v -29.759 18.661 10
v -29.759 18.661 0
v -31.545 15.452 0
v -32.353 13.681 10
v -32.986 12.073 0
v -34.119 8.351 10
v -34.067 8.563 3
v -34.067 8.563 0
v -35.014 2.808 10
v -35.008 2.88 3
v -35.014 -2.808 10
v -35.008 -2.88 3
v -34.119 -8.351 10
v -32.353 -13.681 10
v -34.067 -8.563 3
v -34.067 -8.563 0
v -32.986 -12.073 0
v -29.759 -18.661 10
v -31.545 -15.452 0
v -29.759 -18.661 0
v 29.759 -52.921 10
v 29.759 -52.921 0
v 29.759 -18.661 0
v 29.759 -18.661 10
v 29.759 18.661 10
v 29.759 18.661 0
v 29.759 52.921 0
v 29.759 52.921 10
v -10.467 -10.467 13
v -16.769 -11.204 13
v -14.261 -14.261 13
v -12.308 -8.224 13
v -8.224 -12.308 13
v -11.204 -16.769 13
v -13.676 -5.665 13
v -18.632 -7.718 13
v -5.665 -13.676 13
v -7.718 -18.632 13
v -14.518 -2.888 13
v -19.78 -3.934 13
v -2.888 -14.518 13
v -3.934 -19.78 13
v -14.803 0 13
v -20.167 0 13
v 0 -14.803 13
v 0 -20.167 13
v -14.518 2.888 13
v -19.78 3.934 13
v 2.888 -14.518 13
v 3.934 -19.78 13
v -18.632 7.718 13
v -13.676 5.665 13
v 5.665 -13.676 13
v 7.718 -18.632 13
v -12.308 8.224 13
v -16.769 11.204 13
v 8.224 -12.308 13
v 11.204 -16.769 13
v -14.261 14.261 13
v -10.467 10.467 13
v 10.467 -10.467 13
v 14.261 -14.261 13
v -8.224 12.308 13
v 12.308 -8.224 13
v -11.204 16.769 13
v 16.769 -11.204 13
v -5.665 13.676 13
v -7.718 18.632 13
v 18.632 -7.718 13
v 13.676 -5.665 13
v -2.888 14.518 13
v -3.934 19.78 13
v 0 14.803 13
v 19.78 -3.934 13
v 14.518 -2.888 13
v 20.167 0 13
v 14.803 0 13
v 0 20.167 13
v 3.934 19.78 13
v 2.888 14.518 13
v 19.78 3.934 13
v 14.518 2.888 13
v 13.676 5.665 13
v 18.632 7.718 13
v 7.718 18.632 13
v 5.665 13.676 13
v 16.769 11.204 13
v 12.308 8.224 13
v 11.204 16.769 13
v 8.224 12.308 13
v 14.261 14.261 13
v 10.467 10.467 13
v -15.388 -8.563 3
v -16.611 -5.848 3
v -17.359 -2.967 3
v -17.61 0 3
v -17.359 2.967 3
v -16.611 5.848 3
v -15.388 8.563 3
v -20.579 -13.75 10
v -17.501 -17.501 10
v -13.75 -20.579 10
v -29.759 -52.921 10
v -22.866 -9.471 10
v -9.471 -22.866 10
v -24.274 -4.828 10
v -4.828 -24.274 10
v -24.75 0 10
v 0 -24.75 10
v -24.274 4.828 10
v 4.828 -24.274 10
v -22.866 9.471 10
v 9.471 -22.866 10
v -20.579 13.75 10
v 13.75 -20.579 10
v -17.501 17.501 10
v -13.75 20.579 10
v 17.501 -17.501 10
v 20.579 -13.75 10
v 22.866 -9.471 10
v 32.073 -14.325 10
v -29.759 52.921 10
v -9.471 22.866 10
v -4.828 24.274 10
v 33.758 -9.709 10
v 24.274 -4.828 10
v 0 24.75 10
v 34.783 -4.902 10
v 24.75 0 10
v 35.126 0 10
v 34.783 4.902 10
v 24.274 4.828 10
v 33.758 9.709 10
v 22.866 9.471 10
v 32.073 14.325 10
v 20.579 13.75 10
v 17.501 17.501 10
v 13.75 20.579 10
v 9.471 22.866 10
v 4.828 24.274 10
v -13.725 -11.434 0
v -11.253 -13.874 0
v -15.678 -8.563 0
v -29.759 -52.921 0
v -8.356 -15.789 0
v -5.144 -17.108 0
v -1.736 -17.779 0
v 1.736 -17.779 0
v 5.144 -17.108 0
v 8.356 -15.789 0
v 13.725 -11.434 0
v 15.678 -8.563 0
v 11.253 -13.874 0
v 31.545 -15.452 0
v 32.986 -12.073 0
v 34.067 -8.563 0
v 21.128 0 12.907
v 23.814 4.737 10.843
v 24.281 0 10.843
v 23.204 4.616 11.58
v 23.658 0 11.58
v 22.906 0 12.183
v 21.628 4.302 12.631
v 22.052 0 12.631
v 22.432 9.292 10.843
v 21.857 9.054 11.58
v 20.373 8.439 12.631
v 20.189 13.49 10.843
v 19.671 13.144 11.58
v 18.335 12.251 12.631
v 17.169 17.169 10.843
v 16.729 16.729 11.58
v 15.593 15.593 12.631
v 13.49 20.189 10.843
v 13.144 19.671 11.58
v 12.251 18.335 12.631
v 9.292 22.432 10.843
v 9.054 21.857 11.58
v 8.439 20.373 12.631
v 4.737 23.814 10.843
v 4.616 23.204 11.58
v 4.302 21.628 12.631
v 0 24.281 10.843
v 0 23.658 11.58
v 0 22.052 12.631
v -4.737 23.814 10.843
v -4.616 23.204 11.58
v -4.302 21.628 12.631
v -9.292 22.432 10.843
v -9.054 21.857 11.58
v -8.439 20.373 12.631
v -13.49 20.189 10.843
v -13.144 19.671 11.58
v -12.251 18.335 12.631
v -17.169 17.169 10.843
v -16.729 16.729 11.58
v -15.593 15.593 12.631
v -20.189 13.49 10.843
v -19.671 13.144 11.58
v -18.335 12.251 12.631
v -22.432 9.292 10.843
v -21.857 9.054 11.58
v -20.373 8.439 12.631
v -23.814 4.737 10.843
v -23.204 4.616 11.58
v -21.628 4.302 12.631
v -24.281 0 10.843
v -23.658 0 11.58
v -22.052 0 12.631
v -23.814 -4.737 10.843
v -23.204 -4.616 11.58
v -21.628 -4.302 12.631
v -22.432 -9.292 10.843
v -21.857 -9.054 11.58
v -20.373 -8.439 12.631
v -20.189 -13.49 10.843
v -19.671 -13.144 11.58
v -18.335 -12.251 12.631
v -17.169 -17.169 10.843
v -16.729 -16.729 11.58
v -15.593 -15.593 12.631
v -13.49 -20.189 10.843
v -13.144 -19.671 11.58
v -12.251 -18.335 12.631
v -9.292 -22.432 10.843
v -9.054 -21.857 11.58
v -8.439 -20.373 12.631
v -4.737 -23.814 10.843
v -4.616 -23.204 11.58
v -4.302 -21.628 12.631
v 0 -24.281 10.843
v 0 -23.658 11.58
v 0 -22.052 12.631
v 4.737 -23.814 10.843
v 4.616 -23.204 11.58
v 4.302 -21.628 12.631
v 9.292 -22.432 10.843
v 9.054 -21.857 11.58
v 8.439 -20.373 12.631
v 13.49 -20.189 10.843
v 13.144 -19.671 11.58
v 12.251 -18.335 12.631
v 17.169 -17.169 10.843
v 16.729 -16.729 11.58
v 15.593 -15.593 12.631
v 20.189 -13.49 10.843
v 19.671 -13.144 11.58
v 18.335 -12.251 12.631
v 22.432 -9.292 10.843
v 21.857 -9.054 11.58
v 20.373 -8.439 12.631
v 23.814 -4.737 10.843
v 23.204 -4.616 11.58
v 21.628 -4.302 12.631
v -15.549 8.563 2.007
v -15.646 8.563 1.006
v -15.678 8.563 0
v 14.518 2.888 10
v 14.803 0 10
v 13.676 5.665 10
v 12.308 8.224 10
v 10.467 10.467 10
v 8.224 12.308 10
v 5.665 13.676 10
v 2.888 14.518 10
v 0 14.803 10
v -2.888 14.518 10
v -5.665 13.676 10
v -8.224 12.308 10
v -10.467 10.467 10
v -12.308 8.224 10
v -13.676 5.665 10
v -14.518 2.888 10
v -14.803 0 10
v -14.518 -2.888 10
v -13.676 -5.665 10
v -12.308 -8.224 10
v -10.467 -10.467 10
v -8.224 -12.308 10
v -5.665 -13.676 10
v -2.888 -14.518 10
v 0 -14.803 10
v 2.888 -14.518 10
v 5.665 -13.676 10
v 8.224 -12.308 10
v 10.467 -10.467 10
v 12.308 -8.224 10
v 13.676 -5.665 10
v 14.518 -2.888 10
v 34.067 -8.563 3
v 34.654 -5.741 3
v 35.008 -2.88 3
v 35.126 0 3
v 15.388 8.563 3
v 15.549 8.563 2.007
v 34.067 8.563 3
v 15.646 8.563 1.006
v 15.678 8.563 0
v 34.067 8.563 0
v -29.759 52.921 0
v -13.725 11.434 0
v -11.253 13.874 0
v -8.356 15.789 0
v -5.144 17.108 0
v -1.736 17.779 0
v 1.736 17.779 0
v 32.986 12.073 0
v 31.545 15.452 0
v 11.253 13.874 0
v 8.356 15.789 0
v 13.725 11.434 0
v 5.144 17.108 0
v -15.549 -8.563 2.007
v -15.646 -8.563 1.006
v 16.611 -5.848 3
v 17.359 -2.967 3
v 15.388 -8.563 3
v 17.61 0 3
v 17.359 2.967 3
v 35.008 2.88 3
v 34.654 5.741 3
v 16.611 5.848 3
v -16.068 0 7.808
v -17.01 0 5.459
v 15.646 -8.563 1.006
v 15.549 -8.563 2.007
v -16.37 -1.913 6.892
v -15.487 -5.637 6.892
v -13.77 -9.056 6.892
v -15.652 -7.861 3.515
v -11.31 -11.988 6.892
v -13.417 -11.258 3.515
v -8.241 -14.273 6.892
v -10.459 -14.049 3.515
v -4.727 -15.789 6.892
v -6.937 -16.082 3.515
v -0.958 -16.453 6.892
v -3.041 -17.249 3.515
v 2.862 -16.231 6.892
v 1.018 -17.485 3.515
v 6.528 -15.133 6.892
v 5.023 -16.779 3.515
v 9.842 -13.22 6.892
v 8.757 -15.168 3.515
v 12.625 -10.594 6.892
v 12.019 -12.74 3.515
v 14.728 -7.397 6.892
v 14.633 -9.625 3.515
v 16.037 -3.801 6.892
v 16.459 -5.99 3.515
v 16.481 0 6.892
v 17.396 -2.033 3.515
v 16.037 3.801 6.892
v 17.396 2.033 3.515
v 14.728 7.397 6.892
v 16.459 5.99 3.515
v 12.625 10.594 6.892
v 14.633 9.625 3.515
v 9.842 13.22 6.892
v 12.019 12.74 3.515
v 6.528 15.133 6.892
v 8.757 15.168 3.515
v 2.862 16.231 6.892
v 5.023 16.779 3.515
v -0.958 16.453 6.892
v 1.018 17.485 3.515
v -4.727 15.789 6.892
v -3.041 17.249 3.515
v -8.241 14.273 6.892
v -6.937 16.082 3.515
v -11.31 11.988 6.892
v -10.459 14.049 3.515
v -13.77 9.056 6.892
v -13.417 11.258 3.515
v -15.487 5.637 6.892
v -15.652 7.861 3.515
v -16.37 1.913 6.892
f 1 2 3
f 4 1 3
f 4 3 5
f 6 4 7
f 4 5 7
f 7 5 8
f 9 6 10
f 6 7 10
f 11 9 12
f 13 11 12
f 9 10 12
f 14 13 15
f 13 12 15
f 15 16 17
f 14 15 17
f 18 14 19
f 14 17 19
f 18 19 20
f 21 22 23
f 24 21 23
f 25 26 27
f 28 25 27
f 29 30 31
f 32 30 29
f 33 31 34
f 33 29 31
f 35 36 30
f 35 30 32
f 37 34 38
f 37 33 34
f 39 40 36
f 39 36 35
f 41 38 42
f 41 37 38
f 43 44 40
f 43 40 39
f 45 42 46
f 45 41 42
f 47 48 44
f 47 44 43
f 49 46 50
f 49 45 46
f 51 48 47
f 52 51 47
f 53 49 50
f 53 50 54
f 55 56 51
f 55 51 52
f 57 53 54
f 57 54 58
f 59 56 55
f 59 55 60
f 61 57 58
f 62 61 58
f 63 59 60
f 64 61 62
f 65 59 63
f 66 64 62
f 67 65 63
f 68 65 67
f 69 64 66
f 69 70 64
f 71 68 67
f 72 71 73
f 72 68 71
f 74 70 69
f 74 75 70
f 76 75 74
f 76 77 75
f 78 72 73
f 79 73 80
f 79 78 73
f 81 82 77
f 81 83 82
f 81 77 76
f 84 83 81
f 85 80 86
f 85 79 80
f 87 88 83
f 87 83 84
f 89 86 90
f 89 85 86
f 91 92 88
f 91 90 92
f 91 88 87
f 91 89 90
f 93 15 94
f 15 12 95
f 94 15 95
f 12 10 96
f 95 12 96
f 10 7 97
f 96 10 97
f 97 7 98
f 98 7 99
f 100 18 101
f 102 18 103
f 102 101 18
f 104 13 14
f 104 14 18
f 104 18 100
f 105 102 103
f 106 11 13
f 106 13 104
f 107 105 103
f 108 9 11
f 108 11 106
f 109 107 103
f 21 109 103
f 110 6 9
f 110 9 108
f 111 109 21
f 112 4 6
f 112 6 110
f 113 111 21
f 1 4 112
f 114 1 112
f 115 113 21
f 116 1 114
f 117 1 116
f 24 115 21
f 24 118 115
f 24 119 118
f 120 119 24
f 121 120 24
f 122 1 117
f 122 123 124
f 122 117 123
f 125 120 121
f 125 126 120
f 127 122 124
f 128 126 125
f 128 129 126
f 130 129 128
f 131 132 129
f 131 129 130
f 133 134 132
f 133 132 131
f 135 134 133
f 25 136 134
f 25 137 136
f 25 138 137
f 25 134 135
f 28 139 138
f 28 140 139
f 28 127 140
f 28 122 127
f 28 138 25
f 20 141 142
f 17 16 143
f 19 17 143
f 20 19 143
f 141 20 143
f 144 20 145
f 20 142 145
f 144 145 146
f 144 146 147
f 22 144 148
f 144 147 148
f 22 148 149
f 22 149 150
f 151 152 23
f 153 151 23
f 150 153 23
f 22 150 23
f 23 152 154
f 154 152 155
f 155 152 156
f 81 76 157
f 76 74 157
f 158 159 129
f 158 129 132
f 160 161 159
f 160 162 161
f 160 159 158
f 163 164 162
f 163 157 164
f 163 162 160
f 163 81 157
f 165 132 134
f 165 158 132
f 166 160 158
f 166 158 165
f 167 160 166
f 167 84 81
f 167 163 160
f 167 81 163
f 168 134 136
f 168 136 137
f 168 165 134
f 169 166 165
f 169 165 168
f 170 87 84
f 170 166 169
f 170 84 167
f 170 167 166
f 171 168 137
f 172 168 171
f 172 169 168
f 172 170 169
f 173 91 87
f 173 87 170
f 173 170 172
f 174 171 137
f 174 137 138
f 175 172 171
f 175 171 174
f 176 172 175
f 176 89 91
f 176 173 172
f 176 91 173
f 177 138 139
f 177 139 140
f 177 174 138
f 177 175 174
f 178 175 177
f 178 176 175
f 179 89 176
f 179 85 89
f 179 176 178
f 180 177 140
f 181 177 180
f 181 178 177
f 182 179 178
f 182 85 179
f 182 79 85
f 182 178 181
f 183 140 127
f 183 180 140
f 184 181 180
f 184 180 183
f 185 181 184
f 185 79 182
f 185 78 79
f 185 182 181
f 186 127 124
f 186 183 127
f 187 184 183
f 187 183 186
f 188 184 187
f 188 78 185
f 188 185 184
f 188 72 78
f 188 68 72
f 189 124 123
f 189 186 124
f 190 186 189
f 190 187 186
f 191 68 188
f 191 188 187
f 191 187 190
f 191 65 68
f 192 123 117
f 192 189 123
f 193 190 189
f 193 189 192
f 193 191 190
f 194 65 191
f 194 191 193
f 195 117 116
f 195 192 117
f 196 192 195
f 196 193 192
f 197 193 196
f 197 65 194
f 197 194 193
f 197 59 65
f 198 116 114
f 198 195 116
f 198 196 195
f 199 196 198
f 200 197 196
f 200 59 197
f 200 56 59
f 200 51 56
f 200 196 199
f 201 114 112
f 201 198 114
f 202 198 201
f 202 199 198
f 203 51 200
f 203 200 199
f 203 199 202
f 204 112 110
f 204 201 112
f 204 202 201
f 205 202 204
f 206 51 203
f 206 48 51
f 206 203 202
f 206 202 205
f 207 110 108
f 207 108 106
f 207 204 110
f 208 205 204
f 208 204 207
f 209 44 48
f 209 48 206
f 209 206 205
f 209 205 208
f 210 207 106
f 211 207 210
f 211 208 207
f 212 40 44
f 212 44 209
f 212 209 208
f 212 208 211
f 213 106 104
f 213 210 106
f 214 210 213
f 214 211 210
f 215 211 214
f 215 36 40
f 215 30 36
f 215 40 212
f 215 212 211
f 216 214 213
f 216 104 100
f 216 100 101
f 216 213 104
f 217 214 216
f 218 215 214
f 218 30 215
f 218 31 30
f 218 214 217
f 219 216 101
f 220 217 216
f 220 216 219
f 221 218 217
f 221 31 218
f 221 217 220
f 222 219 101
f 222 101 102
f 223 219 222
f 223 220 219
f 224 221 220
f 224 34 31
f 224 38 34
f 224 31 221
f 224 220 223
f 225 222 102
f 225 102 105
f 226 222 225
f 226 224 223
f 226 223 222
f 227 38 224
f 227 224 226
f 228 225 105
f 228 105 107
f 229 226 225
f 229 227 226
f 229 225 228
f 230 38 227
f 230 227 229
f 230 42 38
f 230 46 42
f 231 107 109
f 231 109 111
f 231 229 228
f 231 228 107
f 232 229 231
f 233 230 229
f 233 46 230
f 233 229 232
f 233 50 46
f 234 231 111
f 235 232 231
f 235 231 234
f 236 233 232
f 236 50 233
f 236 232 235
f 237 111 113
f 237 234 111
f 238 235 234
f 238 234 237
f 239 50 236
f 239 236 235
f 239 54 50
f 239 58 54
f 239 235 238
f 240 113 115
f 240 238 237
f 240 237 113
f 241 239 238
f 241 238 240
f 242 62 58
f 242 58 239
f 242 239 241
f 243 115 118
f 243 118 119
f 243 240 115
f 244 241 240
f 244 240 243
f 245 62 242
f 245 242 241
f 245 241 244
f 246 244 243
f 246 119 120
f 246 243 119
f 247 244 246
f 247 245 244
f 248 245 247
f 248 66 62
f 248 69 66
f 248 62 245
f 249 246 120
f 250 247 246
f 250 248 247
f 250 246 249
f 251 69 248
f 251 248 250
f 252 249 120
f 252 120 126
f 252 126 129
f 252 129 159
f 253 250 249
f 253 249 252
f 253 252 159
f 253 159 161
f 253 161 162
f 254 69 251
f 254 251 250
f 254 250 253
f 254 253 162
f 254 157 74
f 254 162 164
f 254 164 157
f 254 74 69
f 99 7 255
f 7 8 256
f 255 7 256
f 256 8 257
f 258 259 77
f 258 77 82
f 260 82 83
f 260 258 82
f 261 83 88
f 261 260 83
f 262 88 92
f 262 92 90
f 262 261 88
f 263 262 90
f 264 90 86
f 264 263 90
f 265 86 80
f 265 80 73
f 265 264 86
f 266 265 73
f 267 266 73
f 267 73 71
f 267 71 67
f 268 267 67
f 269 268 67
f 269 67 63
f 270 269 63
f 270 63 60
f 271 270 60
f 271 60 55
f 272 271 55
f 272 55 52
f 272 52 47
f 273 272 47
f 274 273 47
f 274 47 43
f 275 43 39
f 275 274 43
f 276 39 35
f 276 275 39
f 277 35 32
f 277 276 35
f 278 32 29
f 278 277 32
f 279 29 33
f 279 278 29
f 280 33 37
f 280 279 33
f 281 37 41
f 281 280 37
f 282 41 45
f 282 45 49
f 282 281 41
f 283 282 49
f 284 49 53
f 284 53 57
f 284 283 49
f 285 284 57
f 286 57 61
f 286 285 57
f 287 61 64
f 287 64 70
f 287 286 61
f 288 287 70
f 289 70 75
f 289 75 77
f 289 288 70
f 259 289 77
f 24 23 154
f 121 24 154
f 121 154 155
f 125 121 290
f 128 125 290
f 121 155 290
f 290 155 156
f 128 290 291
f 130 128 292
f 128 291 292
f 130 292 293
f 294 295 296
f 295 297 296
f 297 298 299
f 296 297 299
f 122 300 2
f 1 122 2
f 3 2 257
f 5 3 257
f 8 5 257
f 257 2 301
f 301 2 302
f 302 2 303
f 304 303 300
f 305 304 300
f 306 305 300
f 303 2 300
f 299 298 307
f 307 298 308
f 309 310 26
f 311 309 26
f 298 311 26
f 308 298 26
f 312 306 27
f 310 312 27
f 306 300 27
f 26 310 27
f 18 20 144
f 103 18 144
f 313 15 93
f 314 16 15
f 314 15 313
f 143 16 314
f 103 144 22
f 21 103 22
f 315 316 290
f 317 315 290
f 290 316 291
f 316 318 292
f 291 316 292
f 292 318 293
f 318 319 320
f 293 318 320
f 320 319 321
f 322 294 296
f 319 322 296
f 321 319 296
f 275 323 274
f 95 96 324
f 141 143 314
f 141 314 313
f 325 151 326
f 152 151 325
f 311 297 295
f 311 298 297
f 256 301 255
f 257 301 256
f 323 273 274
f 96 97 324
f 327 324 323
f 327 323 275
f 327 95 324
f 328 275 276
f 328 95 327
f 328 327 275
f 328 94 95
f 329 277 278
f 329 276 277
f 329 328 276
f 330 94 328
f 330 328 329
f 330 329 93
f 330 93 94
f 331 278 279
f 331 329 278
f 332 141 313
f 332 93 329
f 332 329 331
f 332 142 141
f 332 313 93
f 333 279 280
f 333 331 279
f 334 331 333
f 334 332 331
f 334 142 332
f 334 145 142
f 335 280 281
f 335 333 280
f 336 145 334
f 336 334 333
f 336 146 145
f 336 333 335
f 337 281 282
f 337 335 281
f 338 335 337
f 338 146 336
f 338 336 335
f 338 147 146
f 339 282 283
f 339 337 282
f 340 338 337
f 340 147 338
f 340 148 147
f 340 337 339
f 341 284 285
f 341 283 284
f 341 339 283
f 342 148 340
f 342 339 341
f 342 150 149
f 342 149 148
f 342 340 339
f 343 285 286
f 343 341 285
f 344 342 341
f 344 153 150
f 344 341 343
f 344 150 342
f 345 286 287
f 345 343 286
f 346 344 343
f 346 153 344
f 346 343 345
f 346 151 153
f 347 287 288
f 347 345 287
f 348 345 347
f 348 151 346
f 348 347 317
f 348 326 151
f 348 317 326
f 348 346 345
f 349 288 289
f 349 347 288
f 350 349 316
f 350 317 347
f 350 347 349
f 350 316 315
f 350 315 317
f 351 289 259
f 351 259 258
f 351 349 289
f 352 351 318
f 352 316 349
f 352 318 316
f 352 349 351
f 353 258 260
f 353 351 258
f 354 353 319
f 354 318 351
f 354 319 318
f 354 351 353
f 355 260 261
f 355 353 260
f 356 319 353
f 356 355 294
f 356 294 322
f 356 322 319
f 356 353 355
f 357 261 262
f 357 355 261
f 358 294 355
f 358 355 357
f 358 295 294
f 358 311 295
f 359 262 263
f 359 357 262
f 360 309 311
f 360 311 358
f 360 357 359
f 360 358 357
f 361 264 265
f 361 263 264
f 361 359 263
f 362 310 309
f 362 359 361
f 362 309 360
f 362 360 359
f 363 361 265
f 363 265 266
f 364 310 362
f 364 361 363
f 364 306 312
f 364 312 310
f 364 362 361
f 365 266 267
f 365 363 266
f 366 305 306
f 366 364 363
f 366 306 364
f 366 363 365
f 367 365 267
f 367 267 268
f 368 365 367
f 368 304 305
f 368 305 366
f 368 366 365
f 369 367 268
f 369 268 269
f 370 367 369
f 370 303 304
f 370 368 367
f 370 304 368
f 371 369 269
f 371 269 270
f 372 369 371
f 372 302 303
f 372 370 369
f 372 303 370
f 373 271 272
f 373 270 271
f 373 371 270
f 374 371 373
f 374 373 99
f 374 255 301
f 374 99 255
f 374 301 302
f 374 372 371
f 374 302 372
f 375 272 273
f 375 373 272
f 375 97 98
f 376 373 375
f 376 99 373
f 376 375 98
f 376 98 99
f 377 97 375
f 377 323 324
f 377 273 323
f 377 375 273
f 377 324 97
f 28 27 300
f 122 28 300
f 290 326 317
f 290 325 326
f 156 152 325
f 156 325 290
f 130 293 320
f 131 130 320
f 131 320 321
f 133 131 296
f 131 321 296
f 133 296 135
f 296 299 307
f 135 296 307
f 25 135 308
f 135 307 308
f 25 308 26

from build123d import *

# Parameters (mm, degrees)
F1_DEPTH = 10
F2_W     = 79.171128571
F2_H     = 17.1256698668
F3_DEPTH = 3
F6_R     = 24.75004298
F6_R_2   = 14.8028536267
F7_DEPTH = 3


# Not quite as in the source:
# - a fillet or chamfer that OpenCascade refuses, or shapes differently, is made with other operations: its cross-section is extruded or revolved along the edge and cut away or added


with BuildPart() as f1:
    # F0 (on Top) → F1 (new body)
    with BuildSketch(Plane.XY):
        with BuildLine():
            Line((-29.7593586147, -18.6613375429), (-29.7593586147, -52.9211238027))
            Line((-29.7593586147, -52.9211238027), (29.7593586147, -52.9211238027))
            Line((29.7593586147, -52.9211238027), (29.7593586147, -18.6613375429))
            ThreePointArc((29.7593586147, -18.6613375429), (0, -35.1264137658), (-29.7593586147, -18.6613375429))
        make_face()
        with BuildLine():
            ThreePointArc((-29.7593586147, 18.6613375429), (-35.1264137658, 0), (-29.7593586147, -18.6613375429))
            Line((-29.7593586147, -18.6613375429), (-29.7593586147, 18.6613375429))
        make_face()
        with BuildLine():
            Line((-29.7593586147, 18.6613375429), (-29.7593586147, -18.6613375429))
            ThreePointArc((-29.7593586147, -18.6613375429), (0, -35.1264137658), (29.7593586147, -18.6613375429))
            Line((29.7593586147, -18.6613375429), (29.7593586147, 18.6613375429))
            ThreePointArc((29.7593586147, 18.6613375429), (0, 35.1264137658), (-29.7593586147, 18.6613375429))
        make_face()
        with BuildLine():
            Line((29.7593586147, 18.6613375429), (29.7593586147, -18.6613375429))
            ThreePointArc((29.7593586147, -18.6613375429), (33.7579952615, -9.7088979792), (35.1264137658, 0))
            ThreePointArc((35.1264137658, 0), (33.7579952615, 9.7088979792), (29.7593586147, 18.6613375429))
        make_face()
        with BuildLine():
            Line((-29.7593586147, 52.9211238027), (-29.7593586147, 18.6613375429))
            ThreePointArc((-29.7593586147, 18.6613375429), (0, 35.1264137658), (29.7593586147, 18.6613375429))
            Line((29.7593586147, 18.6613375429), (29.7593586147, 52.9211238027))
            Line((29.7593586147, 52.9211238027), (-29.7593586147, 52.9211238027))
        make_face()
    extrude(amount=F1_DEPTH)

    # F2 (on Top) → F3 (cut)
    with BuildSketch(Plane.XY):
        Rectangle(F2_W, F2_H)
    extrude(amount=F3_DEPTH, mode=Mode.SUBTRACT)

    # F4 (on Front) → F5 (revolve, cut)
    with BuildSketch(Plane.XZ):
        with BuildLine():
            Line((0, -17.8640554044), (0, 17.8640554044))
            ThreePointArc((0, 17.8640554044), (-17.8640554044, 0), (0, -17.8640554044))
        make_face()
    revolve(axis=Axis((0, 0, 2.6136357337), (0, 0, 1)), mode=Mode.SUBTRACT)

    # F6 (on face) → F7 (join)
    with BuildSketch(Plane.XY.offset(10)):
        Circle(F6_R)
        Circle(F6_R_2, mode=Mode.SUBTRACT)
    extrude(amount=F7_DEPTH)

    # F8: fillet of radius 5 on 1 edges, made by hand

    # F8_s1 → F8_t2 (revolve, cut)
    with BuildSketch(Plane.XZ):
        with BuildLine():
            ThreePointArc((24.75004298, 10), (22.9060800725, 12.1833001327), (20.167467285, 13))
            Line((20.167467285, 13), (24.75004298, 13))
            Line((24.75004298, 13), (24.75004298, 10))
        make_face()
    revolve(axis=Axis((0, 0, 13), (0, 0, 1)), mode=Mode.SUBTRACT)


solid = f1.part
